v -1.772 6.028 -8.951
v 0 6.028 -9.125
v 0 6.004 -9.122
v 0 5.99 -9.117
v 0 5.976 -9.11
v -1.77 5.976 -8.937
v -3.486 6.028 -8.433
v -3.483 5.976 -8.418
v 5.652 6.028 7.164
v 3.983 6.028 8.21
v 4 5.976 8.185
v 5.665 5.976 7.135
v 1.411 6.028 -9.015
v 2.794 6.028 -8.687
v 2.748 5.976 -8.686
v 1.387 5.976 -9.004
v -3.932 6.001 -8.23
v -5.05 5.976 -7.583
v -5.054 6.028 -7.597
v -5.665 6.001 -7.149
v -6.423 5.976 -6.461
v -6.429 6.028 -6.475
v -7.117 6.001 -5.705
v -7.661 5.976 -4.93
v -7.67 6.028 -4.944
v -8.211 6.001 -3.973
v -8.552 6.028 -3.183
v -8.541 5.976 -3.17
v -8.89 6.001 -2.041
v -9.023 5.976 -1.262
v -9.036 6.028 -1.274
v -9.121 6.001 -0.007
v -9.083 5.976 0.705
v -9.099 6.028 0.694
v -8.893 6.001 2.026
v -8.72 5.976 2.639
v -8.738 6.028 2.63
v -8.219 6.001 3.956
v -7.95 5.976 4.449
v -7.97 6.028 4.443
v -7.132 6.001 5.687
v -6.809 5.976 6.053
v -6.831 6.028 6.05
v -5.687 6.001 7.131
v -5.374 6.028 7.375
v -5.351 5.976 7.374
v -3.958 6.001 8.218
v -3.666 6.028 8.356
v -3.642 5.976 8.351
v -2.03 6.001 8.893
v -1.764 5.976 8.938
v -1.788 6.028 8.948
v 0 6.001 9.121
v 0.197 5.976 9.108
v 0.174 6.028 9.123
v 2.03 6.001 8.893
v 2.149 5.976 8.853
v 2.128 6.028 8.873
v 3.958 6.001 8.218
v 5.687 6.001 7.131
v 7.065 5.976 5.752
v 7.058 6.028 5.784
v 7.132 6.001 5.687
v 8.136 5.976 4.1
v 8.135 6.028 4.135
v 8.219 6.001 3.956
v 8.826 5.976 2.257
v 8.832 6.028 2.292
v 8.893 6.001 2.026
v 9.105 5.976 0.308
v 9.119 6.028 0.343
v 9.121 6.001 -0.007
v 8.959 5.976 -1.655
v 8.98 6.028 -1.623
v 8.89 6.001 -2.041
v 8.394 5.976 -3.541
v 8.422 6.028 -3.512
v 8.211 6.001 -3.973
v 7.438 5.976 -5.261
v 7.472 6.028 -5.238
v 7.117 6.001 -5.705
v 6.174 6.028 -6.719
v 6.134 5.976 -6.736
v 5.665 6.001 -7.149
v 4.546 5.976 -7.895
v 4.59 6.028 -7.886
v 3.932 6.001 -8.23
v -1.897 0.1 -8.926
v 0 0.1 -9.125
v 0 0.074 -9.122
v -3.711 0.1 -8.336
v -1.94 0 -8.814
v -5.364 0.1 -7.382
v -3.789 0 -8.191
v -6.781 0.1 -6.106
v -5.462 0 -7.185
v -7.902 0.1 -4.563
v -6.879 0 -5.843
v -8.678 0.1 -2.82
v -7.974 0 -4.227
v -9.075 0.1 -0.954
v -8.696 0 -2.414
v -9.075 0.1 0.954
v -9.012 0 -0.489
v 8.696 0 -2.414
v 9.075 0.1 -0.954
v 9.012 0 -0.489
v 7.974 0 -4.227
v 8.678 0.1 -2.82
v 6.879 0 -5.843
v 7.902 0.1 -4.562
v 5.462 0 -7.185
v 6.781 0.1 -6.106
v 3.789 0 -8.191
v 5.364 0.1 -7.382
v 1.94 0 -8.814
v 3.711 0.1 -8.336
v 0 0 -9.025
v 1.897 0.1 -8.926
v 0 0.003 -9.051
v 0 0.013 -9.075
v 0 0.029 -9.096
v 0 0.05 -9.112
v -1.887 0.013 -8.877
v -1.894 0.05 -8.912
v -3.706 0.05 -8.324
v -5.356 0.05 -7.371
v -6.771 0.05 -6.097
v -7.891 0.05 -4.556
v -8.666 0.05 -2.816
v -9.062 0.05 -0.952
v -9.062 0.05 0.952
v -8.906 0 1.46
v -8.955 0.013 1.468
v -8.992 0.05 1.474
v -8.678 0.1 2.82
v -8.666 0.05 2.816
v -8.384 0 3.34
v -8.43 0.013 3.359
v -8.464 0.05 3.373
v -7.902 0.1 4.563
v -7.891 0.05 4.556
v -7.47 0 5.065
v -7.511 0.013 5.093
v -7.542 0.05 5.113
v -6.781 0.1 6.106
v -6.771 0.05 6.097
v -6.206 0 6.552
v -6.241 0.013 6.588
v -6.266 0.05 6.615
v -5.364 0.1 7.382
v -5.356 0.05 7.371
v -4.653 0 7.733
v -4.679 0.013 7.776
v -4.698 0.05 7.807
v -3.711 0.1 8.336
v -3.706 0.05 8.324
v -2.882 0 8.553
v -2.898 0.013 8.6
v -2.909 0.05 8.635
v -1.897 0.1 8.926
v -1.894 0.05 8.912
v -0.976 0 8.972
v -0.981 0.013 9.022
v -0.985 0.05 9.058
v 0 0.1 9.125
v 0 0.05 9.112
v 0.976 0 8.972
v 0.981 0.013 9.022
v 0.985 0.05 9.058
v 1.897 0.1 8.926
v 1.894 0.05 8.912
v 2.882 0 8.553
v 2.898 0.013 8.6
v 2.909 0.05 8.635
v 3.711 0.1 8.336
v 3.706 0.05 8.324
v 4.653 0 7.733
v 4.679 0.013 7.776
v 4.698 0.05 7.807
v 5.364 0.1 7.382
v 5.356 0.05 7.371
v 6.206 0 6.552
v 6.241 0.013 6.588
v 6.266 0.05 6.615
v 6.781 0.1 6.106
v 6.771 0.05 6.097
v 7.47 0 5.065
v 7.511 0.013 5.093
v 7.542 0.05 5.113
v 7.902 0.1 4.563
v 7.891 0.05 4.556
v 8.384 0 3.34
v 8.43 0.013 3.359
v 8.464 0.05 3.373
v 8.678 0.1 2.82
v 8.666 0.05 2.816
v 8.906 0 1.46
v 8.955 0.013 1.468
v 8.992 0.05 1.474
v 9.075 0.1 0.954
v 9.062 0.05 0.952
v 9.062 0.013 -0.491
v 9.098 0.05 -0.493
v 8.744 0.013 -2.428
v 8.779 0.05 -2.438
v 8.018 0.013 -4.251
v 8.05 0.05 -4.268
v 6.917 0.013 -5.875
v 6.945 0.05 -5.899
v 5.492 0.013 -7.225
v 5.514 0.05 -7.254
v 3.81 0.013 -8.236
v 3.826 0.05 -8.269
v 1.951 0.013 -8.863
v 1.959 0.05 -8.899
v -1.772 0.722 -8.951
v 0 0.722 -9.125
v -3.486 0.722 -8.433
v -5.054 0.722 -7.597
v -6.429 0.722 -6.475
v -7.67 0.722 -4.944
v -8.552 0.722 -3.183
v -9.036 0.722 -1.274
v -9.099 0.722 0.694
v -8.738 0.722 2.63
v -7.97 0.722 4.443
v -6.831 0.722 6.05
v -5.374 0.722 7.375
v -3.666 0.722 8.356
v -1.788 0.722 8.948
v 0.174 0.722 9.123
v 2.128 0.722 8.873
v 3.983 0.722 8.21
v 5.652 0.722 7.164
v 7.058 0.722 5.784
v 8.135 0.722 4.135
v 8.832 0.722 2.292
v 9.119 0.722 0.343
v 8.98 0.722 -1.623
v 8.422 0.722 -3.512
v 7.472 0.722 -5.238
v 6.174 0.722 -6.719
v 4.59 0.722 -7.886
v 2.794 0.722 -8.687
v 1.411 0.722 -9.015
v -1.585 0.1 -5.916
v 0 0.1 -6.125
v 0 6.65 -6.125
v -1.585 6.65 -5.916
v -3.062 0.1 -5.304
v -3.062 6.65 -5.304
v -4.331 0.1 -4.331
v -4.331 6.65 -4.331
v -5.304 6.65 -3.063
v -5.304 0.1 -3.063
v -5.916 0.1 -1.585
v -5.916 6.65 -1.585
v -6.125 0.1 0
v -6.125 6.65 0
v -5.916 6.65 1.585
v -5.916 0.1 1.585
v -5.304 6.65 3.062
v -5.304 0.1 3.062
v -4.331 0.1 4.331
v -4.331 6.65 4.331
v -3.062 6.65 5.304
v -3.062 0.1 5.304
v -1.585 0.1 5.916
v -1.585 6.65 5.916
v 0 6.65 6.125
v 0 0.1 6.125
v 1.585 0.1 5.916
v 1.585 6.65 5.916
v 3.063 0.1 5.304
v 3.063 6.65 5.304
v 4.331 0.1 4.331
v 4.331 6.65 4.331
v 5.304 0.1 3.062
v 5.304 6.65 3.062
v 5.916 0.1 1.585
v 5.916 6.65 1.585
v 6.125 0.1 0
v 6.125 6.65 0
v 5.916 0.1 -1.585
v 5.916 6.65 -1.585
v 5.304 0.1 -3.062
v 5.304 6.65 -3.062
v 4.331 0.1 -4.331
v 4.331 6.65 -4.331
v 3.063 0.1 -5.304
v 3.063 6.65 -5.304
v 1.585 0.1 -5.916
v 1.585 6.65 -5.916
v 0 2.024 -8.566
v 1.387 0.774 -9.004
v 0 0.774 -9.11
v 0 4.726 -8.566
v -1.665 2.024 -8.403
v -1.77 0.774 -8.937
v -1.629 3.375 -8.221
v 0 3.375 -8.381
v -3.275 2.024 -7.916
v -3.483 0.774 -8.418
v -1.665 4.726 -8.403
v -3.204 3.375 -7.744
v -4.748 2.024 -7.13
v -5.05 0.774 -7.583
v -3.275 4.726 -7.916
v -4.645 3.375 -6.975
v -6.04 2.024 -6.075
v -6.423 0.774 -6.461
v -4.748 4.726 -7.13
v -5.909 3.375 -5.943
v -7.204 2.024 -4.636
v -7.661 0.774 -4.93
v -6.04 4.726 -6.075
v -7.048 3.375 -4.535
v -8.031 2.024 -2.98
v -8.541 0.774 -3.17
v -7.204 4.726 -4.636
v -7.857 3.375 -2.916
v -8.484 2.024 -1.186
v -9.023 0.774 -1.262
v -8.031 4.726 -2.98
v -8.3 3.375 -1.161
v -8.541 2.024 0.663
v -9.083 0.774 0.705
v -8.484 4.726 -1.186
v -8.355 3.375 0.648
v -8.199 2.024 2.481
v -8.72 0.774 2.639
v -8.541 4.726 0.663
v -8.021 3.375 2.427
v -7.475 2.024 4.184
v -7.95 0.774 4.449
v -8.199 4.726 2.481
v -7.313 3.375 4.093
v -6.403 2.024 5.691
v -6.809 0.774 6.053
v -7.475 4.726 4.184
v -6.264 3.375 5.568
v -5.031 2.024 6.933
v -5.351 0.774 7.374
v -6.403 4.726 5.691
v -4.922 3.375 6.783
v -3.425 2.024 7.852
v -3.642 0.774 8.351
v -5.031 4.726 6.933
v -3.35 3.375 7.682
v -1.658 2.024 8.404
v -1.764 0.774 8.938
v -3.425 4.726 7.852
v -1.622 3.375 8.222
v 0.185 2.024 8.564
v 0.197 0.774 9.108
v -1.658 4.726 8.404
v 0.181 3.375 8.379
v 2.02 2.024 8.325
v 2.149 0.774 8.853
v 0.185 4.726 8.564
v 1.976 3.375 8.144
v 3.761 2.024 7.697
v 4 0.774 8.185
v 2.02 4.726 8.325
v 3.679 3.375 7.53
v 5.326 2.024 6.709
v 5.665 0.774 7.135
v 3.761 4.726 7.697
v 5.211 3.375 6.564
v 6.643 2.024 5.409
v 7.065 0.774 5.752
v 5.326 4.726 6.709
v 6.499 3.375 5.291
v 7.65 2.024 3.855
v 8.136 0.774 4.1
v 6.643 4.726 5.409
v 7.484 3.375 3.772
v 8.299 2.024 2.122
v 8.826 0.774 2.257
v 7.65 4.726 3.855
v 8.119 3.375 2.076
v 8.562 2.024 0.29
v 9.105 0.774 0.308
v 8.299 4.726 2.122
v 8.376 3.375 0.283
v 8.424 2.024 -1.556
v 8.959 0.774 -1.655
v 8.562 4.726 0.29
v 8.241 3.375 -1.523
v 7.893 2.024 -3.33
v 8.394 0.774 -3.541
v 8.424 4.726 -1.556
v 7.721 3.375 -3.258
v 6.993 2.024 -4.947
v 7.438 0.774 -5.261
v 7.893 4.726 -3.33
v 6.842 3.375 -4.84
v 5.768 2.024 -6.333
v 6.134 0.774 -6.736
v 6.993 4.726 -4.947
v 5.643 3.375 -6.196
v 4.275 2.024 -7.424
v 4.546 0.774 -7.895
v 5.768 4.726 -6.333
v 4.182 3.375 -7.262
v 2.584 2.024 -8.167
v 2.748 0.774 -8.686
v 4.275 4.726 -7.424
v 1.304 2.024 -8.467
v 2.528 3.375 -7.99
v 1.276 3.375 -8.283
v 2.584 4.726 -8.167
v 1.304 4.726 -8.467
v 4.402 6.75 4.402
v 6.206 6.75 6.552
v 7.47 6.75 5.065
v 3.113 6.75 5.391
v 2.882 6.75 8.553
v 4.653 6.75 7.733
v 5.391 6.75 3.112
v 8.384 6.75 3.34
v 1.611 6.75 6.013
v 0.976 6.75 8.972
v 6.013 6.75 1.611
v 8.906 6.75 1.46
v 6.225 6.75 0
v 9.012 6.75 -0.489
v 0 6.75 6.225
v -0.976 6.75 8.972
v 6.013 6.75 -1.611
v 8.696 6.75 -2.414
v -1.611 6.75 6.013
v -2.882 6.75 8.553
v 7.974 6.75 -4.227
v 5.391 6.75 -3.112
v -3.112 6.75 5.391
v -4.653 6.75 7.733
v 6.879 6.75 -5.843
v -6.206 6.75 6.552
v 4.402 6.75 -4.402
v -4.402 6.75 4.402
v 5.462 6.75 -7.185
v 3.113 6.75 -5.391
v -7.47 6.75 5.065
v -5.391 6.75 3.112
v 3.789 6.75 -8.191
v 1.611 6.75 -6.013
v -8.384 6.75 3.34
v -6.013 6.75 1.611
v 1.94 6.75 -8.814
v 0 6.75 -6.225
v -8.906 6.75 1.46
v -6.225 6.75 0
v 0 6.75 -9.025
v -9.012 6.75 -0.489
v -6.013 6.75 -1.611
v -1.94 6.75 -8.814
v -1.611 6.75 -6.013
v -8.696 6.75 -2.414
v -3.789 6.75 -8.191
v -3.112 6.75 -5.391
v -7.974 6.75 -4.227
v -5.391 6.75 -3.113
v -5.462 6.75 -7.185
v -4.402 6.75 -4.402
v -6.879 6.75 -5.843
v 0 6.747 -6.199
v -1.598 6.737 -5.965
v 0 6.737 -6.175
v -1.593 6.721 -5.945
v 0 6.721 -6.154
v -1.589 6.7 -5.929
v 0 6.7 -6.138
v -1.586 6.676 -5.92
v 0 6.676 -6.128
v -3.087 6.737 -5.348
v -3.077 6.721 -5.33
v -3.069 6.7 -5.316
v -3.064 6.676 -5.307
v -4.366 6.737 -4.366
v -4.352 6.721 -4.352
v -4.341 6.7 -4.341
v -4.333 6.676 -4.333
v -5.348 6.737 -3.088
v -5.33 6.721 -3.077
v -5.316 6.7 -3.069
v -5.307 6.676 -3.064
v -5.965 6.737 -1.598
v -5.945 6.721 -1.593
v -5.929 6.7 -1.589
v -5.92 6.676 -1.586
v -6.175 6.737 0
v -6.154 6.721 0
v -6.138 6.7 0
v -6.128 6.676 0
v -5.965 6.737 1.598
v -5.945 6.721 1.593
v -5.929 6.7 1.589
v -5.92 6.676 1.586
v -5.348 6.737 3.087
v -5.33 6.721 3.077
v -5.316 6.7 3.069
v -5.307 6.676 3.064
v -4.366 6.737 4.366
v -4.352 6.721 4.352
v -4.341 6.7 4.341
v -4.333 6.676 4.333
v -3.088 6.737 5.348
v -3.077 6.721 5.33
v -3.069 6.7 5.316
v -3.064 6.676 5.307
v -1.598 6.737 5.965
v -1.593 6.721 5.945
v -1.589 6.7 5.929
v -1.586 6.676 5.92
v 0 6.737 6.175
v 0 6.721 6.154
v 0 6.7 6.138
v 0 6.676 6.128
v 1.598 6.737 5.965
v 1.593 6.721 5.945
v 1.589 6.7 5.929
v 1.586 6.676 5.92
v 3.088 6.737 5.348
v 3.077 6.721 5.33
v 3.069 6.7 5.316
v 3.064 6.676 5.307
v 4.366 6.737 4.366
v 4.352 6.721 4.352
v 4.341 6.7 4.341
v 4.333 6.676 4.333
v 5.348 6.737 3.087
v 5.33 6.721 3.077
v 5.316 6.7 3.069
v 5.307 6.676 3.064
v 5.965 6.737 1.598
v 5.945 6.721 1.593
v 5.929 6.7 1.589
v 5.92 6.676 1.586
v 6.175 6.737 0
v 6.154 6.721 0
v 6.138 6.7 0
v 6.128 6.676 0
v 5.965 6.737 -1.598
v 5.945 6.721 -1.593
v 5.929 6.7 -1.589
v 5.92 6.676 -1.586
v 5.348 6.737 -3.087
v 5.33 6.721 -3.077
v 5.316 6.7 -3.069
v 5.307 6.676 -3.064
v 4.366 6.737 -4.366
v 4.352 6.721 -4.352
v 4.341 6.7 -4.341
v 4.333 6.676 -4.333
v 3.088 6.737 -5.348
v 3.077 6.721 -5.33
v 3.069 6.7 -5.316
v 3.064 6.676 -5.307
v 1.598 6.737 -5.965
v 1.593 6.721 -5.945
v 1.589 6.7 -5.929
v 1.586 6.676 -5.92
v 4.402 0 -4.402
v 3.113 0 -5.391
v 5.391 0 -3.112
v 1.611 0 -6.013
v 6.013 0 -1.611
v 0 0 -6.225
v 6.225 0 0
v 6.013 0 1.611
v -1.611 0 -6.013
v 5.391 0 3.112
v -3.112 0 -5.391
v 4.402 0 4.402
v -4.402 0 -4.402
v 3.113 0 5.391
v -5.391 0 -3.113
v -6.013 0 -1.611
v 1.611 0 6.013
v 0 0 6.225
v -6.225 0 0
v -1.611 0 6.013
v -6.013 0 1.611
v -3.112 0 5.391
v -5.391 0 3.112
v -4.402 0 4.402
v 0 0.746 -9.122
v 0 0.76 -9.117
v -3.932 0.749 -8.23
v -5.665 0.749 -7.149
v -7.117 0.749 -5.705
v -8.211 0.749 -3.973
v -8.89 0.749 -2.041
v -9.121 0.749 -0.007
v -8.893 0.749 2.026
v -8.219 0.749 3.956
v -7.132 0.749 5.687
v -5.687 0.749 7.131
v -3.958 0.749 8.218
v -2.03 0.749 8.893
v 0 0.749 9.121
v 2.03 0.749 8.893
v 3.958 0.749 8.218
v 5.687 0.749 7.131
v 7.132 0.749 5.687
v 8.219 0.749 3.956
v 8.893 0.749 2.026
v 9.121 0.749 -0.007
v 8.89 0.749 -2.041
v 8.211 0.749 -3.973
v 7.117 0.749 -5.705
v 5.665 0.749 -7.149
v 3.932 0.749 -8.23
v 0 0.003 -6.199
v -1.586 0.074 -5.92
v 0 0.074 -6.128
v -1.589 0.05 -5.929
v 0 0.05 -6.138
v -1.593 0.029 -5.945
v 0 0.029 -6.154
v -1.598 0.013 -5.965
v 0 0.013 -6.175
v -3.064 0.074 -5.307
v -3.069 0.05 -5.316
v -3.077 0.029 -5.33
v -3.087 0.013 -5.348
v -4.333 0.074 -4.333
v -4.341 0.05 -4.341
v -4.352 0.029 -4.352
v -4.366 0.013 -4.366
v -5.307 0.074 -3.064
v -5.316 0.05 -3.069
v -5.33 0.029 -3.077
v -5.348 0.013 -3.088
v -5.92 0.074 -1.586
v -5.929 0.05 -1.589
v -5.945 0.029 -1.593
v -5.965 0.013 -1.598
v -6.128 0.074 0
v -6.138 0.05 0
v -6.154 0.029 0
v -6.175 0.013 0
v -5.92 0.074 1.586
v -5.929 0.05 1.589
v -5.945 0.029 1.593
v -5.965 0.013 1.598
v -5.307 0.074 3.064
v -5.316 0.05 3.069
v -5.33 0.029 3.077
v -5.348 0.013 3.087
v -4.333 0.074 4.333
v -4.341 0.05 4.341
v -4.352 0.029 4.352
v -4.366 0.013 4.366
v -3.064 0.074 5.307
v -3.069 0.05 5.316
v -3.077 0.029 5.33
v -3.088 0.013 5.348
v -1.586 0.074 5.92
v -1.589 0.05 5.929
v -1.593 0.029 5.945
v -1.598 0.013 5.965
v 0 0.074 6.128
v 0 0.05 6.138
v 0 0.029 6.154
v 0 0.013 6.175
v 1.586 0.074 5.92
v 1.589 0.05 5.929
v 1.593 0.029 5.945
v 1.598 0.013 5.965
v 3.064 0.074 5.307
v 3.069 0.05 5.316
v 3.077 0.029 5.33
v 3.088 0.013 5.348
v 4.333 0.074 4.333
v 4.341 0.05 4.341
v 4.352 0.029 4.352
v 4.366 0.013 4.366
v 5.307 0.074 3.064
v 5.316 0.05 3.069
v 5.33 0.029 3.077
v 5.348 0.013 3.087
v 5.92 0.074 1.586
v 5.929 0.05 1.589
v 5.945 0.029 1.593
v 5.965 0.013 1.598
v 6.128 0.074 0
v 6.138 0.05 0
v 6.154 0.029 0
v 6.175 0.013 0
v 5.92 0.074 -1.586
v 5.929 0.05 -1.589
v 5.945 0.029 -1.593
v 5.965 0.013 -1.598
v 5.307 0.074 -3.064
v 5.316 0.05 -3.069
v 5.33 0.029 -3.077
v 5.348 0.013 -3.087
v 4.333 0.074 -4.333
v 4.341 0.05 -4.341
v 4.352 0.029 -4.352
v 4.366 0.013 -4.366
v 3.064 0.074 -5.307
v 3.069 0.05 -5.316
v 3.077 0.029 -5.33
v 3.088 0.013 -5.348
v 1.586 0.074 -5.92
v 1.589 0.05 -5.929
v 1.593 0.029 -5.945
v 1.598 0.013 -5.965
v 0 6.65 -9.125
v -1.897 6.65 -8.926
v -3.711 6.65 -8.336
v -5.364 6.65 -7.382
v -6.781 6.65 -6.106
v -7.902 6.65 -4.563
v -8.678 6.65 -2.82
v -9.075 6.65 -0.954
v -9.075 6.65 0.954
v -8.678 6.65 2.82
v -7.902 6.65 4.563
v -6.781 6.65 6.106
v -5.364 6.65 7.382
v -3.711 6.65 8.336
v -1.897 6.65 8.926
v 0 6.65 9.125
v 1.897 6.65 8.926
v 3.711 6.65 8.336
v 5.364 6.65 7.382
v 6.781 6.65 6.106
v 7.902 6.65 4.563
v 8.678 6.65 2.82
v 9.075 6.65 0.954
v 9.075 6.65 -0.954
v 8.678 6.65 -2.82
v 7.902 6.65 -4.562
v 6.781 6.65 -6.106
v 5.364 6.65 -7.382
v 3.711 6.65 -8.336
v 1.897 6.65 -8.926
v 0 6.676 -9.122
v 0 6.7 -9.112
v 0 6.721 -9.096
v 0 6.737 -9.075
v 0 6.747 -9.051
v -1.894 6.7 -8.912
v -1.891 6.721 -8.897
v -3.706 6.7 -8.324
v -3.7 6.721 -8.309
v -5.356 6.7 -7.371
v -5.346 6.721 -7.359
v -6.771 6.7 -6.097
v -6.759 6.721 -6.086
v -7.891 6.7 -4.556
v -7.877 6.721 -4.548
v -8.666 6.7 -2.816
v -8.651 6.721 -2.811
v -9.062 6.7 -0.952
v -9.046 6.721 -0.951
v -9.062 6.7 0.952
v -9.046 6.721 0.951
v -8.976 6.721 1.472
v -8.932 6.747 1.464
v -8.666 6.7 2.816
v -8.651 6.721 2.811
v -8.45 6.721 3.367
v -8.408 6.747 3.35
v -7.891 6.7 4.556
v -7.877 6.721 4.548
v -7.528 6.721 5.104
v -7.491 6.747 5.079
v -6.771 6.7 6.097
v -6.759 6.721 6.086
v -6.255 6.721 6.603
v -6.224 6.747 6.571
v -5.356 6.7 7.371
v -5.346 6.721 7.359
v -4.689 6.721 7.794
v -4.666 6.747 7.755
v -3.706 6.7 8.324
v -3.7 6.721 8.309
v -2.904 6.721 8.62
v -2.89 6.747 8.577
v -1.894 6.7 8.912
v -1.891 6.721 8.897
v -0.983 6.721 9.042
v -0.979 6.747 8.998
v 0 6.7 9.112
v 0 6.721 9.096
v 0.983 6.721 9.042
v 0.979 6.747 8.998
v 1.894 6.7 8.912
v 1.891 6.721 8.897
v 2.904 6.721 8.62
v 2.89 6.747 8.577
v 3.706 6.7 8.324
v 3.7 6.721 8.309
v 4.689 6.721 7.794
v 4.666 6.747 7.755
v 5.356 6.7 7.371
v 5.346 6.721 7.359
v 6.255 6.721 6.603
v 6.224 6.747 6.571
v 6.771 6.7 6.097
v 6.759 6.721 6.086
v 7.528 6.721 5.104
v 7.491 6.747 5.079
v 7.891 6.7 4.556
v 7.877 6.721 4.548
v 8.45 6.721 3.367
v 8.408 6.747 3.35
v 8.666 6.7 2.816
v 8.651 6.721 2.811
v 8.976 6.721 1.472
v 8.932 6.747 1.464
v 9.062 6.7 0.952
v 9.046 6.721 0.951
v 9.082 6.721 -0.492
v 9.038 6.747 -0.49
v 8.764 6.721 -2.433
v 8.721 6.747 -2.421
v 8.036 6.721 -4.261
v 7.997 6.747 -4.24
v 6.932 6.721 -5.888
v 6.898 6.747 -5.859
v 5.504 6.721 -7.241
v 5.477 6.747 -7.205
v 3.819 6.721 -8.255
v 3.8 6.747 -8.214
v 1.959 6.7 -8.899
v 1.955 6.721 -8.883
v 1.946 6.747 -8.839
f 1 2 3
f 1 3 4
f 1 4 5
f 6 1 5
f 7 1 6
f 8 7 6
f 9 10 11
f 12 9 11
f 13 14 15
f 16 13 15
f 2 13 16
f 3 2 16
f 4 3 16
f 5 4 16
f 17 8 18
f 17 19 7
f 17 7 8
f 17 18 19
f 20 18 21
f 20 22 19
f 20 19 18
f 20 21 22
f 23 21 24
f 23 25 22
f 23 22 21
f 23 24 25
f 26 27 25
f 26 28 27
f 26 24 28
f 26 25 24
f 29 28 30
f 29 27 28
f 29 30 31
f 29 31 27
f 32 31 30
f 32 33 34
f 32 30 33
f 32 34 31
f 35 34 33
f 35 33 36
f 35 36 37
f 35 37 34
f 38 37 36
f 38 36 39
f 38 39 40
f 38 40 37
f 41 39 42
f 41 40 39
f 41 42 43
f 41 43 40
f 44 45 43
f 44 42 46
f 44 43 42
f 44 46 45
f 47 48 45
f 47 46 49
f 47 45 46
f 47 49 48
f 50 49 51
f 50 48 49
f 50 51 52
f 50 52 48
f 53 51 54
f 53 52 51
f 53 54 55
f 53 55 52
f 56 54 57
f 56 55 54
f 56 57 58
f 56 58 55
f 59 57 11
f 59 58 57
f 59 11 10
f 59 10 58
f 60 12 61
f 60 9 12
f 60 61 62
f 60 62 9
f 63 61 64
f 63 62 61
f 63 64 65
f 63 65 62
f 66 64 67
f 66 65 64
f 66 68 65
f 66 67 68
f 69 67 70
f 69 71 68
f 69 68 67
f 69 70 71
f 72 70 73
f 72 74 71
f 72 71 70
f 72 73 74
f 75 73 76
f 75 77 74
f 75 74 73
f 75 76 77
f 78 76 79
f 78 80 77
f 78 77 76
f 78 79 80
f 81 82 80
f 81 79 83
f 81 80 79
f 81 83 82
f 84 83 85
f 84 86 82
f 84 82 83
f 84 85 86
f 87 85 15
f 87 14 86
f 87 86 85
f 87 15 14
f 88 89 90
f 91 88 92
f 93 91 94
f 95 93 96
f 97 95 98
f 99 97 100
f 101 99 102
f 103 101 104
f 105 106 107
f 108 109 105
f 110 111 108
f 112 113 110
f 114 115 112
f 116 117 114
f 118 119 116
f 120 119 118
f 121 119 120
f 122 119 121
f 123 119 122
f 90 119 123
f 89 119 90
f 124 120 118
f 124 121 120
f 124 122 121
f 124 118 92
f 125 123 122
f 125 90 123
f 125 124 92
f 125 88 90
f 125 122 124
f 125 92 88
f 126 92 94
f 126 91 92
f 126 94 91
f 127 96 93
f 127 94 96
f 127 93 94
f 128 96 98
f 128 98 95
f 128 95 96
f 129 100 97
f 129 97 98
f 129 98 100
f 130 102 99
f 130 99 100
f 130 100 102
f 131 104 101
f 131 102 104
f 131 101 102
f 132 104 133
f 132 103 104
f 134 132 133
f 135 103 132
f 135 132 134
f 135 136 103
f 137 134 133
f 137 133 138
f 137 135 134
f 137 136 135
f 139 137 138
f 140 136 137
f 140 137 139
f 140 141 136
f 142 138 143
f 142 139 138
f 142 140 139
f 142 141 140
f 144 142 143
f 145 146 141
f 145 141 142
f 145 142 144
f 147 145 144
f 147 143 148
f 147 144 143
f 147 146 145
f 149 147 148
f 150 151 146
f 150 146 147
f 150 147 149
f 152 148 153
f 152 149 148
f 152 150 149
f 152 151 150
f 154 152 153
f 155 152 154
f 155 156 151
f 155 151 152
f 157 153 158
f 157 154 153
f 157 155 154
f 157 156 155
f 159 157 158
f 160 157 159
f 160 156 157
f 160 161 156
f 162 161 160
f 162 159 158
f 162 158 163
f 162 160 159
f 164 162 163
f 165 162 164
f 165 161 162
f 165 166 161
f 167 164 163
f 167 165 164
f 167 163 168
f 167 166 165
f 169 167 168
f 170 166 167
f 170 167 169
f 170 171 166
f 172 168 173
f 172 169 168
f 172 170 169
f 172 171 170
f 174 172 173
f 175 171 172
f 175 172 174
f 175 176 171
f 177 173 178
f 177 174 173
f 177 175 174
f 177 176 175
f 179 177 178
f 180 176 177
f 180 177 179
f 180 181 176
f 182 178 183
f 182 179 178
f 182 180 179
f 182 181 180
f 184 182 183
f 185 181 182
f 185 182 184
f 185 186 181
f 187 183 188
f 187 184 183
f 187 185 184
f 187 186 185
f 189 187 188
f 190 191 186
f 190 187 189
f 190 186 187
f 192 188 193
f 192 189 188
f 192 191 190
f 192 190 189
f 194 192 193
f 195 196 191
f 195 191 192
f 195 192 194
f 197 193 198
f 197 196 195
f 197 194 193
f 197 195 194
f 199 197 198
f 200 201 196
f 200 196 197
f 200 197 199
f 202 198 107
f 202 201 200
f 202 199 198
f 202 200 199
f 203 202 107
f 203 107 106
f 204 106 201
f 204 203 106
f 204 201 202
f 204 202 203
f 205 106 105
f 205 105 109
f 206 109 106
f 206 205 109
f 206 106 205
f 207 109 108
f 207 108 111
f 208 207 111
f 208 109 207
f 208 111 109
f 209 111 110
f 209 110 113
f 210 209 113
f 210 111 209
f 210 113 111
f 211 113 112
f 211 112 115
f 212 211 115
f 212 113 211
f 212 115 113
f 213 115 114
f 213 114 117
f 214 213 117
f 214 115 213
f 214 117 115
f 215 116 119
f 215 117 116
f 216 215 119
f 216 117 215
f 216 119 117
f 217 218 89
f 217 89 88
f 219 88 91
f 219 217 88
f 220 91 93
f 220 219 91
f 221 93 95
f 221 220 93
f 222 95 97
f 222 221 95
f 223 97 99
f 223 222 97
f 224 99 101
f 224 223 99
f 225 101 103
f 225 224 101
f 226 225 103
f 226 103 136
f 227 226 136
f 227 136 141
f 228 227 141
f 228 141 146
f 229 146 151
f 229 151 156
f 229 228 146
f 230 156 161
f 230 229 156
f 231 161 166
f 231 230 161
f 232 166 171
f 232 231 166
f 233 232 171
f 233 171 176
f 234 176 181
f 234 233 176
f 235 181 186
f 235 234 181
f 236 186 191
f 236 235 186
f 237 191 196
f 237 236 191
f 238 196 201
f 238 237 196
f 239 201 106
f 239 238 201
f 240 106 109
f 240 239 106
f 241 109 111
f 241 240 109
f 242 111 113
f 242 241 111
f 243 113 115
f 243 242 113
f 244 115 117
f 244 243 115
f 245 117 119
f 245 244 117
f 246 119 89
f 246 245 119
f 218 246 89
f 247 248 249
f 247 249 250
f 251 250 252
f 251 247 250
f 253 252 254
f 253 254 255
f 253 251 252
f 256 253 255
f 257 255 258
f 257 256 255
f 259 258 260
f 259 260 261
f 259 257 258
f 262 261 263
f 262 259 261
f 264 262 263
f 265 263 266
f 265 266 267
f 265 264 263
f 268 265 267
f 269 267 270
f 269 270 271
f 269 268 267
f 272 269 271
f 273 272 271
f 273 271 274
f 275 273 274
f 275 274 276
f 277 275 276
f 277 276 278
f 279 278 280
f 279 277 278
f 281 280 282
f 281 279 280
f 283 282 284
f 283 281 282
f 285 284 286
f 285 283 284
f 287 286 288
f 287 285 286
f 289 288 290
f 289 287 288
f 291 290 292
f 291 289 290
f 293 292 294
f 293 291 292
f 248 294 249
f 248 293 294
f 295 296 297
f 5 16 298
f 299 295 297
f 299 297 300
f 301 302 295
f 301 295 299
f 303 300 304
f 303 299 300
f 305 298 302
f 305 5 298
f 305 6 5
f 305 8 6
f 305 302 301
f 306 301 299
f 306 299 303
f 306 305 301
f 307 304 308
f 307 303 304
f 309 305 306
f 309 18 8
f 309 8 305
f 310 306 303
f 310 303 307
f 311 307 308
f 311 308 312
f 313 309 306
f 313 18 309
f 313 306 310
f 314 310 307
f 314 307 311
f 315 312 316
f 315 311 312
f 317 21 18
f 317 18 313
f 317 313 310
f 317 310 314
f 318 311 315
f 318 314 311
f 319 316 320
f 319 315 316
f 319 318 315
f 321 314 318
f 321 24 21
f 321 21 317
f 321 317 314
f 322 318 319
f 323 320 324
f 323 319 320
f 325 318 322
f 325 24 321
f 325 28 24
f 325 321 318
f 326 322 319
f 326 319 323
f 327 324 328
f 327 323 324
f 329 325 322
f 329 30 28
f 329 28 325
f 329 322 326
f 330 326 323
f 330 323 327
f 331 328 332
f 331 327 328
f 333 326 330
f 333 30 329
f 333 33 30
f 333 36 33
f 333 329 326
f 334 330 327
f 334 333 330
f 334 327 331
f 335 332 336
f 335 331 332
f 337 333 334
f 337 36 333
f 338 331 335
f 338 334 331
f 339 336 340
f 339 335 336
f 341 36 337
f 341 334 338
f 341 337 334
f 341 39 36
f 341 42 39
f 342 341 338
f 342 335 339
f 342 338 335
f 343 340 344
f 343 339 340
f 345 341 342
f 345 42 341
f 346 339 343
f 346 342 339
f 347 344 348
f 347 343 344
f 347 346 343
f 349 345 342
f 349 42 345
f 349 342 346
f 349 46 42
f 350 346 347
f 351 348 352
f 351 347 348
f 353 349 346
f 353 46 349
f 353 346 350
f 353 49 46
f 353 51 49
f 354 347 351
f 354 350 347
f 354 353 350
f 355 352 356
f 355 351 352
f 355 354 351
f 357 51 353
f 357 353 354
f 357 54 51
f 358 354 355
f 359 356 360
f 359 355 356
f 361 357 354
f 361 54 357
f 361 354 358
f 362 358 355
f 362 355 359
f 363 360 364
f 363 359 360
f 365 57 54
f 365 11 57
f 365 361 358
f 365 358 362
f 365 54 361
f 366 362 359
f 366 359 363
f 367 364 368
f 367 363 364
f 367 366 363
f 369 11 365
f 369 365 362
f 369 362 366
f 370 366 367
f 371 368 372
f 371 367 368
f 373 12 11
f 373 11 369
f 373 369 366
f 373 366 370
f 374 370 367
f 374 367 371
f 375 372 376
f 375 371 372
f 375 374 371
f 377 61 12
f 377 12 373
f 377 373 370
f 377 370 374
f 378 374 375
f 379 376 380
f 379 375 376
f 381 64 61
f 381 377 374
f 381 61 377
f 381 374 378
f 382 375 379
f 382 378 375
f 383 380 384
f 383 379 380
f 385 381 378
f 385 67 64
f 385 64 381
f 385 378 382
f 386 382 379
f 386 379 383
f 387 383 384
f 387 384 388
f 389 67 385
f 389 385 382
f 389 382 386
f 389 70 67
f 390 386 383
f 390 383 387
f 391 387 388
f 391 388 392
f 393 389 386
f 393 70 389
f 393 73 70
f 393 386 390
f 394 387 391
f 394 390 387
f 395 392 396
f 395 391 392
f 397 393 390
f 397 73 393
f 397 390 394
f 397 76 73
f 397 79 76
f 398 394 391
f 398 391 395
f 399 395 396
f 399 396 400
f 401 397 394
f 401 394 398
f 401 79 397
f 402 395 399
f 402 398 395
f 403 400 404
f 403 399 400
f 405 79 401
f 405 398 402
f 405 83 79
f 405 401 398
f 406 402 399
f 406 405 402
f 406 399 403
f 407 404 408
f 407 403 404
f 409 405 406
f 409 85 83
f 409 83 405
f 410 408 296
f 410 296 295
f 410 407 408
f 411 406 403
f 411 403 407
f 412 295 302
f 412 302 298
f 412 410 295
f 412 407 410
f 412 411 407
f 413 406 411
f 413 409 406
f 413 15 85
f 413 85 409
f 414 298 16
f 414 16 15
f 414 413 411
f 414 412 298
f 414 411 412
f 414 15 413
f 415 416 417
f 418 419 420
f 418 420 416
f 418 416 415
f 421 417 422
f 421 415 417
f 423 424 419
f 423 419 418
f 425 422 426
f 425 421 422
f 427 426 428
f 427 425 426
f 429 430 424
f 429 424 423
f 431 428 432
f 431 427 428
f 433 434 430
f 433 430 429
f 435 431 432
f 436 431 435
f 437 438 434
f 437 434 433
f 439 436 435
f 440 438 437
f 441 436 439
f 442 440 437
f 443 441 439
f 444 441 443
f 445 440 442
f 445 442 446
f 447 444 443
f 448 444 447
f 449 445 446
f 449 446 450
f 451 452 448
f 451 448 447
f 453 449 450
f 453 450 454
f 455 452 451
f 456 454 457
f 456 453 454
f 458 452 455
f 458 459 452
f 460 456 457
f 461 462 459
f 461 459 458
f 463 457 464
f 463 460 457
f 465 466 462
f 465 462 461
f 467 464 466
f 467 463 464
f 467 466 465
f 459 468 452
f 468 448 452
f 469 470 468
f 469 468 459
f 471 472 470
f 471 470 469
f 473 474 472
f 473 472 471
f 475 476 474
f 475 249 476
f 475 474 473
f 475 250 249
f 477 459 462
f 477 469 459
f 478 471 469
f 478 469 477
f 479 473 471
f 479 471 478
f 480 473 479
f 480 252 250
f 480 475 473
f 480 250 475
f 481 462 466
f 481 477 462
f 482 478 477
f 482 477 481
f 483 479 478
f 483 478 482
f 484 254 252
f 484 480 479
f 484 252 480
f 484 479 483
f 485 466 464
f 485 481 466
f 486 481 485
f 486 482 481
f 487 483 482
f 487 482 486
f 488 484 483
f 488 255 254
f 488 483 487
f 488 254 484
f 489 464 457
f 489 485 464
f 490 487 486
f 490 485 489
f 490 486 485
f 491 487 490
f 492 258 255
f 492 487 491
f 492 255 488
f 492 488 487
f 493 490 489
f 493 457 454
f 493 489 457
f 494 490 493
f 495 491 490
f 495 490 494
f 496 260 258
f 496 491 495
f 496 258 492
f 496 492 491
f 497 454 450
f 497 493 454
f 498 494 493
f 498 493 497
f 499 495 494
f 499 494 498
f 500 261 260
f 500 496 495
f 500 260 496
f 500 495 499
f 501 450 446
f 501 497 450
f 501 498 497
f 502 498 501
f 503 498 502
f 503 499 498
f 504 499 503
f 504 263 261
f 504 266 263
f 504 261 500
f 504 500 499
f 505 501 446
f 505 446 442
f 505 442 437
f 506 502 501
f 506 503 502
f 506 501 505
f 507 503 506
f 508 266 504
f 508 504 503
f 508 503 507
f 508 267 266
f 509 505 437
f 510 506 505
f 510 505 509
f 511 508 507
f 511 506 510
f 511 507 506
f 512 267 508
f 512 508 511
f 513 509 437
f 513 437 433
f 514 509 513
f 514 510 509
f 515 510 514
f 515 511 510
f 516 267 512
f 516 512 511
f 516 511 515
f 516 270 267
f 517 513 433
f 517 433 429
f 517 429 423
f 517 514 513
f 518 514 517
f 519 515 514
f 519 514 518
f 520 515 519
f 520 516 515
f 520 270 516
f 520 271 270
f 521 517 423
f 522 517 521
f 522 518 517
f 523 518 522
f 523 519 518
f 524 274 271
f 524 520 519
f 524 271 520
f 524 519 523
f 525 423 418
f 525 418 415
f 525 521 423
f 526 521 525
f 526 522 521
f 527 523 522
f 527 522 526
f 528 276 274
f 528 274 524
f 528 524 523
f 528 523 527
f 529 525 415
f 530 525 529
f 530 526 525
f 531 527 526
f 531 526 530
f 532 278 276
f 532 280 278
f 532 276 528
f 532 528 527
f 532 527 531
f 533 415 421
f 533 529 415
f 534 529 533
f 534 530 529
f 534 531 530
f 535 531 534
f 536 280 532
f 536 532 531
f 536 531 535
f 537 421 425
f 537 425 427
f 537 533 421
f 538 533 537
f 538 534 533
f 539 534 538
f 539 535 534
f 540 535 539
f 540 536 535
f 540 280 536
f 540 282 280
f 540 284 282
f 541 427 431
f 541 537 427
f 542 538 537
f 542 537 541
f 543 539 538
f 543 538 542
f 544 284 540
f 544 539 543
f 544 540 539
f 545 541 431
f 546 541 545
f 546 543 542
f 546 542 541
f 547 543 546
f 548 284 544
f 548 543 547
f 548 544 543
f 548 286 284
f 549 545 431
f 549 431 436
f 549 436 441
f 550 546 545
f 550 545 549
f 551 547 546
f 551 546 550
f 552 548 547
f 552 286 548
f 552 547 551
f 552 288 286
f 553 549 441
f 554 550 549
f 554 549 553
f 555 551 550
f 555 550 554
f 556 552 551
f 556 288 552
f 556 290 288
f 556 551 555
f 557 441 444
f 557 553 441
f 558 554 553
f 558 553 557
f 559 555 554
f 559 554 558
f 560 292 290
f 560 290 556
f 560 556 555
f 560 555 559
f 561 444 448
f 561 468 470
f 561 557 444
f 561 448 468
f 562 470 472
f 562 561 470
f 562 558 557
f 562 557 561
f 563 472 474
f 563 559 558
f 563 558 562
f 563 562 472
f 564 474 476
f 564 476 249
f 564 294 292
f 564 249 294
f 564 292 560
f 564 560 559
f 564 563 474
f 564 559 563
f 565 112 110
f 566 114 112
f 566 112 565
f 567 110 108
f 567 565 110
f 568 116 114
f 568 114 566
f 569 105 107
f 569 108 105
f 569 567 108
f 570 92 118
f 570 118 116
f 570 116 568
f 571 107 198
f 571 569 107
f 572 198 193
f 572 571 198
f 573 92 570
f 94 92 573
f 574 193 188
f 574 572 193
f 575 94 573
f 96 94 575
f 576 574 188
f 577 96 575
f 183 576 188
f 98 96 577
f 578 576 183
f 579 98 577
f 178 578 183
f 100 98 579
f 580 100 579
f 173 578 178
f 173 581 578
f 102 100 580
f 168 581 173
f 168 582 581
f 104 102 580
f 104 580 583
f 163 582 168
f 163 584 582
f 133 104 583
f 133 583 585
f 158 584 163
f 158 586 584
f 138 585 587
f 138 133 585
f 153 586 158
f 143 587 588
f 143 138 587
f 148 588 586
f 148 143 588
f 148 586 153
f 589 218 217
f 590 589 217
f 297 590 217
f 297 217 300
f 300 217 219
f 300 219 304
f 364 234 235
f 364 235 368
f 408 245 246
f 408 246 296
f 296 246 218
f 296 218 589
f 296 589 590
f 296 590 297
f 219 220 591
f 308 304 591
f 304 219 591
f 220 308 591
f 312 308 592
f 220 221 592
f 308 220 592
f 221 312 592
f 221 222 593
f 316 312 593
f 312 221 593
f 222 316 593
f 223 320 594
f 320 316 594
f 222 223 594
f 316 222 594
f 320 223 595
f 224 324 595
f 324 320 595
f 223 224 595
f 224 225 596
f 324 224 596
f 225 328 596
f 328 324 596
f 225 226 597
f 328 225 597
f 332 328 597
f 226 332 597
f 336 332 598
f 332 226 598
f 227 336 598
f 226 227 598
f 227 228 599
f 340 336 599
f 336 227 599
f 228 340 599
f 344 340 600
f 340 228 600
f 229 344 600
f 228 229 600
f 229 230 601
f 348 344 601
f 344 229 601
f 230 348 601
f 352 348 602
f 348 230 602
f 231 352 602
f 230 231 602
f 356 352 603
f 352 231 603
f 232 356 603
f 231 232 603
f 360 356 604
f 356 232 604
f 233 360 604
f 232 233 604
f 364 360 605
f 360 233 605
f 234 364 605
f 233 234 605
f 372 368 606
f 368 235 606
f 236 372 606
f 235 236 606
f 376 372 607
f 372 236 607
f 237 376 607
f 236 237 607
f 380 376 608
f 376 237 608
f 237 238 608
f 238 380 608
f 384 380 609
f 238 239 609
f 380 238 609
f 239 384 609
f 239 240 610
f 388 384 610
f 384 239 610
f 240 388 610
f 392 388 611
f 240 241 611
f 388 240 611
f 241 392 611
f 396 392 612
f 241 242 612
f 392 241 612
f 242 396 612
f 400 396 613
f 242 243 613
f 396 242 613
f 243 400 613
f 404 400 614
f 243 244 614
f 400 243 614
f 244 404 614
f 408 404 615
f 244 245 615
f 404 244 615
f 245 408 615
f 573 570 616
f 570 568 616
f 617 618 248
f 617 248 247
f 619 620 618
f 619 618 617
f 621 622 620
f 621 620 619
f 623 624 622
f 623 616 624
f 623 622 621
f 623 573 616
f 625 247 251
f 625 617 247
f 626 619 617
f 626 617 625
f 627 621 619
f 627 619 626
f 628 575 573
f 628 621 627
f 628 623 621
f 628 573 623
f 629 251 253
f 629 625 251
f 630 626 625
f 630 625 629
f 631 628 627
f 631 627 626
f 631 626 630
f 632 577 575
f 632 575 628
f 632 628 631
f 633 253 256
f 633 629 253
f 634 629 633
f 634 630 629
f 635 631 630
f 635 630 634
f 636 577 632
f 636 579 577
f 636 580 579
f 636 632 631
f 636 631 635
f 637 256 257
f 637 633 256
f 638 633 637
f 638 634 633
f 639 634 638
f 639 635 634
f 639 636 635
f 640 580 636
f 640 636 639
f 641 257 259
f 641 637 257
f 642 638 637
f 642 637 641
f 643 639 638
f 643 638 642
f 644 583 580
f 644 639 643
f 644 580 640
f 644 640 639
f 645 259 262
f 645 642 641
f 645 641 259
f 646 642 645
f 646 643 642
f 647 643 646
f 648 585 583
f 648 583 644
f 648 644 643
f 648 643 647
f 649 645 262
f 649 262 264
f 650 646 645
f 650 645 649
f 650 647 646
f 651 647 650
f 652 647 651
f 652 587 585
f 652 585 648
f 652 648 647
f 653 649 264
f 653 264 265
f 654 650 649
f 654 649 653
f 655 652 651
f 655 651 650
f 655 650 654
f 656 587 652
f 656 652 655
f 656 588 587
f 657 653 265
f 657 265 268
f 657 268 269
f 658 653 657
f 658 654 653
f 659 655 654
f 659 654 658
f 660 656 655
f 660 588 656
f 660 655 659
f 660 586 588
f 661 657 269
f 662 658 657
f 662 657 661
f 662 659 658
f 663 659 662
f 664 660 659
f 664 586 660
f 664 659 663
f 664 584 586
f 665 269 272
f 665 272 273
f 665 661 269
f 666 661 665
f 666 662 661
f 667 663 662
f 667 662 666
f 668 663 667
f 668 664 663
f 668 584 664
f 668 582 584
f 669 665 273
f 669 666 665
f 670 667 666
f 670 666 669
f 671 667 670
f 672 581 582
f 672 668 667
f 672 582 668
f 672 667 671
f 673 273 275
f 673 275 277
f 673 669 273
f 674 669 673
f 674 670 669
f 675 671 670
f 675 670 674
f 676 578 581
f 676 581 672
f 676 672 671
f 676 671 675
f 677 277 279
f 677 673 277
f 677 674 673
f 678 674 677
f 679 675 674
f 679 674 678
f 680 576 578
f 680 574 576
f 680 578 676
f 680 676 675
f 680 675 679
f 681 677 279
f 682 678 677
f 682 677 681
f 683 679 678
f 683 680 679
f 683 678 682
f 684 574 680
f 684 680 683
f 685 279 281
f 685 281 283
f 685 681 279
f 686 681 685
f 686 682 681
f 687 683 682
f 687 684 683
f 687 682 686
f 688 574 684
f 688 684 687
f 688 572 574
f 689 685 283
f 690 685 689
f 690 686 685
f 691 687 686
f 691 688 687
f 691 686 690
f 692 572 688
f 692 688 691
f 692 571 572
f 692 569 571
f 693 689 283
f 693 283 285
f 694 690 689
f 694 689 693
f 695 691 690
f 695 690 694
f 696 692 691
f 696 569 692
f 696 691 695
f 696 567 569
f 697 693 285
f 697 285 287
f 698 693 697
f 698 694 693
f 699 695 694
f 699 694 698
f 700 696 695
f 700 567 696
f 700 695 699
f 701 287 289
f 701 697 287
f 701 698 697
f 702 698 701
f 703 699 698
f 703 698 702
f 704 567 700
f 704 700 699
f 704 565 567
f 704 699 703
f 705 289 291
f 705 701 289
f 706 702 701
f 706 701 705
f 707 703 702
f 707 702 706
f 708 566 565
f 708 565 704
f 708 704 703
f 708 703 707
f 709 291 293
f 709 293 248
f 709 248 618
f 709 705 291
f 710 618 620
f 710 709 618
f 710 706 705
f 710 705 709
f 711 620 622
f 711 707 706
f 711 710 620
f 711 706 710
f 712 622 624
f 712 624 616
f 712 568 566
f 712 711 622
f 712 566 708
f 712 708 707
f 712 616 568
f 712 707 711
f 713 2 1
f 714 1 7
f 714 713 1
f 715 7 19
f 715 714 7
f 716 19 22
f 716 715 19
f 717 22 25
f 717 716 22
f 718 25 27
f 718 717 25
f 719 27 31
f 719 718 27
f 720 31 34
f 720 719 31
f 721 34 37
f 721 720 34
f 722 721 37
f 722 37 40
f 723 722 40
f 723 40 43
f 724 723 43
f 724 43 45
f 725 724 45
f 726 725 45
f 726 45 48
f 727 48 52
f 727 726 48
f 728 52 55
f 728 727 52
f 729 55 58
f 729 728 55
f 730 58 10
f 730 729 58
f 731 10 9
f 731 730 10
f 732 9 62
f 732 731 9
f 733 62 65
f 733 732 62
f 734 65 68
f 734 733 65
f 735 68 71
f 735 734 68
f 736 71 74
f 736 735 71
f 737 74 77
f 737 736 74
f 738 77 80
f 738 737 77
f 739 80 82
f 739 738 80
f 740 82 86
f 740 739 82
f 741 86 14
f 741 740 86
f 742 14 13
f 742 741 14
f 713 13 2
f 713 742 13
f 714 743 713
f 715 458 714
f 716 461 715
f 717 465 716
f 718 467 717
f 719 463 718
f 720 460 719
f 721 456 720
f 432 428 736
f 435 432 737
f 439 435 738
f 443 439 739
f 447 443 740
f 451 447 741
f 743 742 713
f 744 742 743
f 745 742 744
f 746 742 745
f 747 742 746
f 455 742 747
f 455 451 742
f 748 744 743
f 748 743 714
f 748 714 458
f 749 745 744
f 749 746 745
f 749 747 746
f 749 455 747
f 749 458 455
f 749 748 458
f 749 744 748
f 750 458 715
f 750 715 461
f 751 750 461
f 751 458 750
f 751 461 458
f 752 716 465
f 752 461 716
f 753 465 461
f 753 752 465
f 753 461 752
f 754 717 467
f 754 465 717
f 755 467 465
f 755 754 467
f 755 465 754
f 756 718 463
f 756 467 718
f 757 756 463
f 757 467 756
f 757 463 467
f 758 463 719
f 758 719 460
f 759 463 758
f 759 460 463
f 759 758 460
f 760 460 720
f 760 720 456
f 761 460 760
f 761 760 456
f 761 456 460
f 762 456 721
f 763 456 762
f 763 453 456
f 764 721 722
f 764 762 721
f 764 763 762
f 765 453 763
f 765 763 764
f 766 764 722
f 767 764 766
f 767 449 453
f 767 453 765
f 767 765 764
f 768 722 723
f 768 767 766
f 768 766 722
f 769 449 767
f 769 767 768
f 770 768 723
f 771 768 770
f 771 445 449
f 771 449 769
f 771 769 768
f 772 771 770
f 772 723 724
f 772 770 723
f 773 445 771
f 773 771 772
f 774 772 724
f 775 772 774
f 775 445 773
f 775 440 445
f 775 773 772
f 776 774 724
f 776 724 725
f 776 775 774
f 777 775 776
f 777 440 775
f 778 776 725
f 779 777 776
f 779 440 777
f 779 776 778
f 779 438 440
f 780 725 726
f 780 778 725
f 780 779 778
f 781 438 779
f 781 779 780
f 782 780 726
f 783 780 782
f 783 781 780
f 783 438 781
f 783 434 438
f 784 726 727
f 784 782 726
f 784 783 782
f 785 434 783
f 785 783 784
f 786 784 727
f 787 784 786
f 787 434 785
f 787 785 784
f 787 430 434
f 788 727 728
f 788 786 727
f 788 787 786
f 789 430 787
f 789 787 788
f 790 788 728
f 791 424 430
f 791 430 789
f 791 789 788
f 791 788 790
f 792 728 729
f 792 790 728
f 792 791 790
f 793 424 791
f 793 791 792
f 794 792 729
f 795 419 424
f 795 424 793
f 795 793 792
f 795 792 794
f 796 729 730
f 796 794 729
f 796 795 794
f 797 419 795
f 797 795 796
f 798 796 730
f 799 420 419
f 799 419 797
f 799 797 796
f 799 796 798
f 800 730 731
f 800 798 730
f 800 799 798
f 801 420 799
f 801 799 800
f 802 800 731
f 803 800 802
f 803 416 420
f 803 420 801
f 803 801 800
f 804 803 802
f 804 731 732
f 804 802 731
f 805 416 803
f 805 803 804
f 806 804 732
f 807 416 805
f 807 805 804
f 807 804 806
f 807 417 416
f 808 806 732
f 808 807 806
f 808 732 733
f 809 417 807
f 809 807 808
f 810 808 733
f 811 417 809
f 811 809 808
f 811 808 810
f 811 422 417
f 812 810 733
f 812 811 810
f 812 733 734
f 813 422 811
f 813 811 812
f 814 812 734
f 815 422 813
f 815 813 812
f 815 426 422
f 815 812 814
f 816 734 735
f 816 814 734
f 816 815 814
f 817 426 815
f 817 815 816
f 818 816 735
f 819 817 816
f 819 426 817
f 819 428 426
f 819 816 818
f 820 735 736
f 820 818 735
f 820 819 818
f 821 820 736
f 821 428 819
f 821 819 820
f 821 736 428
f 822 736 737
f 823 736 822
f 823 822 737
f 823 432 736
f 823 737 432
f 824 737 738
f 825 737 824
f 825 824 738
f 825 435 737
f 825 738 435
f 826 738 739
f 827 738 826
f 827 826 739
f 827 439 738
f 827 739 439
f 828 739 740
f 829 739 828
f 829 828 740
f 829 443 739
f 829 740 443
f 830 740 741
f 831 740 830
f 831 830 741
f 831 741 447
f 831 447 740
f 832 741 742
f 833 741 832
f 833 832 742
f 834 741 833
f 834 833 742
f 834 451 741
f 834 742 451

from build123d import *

# Parameters (mm, degrees)
FILLET1_R = 0.1


with BuildPart() as part:
    # Sketch1 → Revolve1 (revolve)
    with BuildSketch(Plane.XY, mode=Mode.PRIVATE) as revolve1_sk:
        with BuildLine():
            Line((9.125, 6), (9.125, 6.75))
            Line((9.125, 6.75), (6.125, 6.75))
            Line((6.125, 6.75), (6.125, 0))
            Line((6.125, 0), (9.125, 0))
            Line((9.125, 0), (9.125, 0.75))
            ThreePointArc((9.125, 0.75), (8.380511133, 3.375), (9.125, 6))
        make_face()
    revolve(revolve1_sk.sketch.rotate(Axis((0, 0, 0), (0, 1, 0)), 90), axis=Axis((0, 0, 0), (0, 1, 0)))

    # Fillet1
    fillet1_edges = [part.edges().sort_by_distance(p)[0] for p in [
        (0, 6.75, 6.125),
        (0, 6.75, 9.125),
        (0, 6, 9.125),
        (0, 0.75, 9.125),
        (0, 0, 9.125),
        (0, 0, 6.125),
    ]]
    fillet(fillet1_edges, radius=FILLET1_R)


solid = part.part
